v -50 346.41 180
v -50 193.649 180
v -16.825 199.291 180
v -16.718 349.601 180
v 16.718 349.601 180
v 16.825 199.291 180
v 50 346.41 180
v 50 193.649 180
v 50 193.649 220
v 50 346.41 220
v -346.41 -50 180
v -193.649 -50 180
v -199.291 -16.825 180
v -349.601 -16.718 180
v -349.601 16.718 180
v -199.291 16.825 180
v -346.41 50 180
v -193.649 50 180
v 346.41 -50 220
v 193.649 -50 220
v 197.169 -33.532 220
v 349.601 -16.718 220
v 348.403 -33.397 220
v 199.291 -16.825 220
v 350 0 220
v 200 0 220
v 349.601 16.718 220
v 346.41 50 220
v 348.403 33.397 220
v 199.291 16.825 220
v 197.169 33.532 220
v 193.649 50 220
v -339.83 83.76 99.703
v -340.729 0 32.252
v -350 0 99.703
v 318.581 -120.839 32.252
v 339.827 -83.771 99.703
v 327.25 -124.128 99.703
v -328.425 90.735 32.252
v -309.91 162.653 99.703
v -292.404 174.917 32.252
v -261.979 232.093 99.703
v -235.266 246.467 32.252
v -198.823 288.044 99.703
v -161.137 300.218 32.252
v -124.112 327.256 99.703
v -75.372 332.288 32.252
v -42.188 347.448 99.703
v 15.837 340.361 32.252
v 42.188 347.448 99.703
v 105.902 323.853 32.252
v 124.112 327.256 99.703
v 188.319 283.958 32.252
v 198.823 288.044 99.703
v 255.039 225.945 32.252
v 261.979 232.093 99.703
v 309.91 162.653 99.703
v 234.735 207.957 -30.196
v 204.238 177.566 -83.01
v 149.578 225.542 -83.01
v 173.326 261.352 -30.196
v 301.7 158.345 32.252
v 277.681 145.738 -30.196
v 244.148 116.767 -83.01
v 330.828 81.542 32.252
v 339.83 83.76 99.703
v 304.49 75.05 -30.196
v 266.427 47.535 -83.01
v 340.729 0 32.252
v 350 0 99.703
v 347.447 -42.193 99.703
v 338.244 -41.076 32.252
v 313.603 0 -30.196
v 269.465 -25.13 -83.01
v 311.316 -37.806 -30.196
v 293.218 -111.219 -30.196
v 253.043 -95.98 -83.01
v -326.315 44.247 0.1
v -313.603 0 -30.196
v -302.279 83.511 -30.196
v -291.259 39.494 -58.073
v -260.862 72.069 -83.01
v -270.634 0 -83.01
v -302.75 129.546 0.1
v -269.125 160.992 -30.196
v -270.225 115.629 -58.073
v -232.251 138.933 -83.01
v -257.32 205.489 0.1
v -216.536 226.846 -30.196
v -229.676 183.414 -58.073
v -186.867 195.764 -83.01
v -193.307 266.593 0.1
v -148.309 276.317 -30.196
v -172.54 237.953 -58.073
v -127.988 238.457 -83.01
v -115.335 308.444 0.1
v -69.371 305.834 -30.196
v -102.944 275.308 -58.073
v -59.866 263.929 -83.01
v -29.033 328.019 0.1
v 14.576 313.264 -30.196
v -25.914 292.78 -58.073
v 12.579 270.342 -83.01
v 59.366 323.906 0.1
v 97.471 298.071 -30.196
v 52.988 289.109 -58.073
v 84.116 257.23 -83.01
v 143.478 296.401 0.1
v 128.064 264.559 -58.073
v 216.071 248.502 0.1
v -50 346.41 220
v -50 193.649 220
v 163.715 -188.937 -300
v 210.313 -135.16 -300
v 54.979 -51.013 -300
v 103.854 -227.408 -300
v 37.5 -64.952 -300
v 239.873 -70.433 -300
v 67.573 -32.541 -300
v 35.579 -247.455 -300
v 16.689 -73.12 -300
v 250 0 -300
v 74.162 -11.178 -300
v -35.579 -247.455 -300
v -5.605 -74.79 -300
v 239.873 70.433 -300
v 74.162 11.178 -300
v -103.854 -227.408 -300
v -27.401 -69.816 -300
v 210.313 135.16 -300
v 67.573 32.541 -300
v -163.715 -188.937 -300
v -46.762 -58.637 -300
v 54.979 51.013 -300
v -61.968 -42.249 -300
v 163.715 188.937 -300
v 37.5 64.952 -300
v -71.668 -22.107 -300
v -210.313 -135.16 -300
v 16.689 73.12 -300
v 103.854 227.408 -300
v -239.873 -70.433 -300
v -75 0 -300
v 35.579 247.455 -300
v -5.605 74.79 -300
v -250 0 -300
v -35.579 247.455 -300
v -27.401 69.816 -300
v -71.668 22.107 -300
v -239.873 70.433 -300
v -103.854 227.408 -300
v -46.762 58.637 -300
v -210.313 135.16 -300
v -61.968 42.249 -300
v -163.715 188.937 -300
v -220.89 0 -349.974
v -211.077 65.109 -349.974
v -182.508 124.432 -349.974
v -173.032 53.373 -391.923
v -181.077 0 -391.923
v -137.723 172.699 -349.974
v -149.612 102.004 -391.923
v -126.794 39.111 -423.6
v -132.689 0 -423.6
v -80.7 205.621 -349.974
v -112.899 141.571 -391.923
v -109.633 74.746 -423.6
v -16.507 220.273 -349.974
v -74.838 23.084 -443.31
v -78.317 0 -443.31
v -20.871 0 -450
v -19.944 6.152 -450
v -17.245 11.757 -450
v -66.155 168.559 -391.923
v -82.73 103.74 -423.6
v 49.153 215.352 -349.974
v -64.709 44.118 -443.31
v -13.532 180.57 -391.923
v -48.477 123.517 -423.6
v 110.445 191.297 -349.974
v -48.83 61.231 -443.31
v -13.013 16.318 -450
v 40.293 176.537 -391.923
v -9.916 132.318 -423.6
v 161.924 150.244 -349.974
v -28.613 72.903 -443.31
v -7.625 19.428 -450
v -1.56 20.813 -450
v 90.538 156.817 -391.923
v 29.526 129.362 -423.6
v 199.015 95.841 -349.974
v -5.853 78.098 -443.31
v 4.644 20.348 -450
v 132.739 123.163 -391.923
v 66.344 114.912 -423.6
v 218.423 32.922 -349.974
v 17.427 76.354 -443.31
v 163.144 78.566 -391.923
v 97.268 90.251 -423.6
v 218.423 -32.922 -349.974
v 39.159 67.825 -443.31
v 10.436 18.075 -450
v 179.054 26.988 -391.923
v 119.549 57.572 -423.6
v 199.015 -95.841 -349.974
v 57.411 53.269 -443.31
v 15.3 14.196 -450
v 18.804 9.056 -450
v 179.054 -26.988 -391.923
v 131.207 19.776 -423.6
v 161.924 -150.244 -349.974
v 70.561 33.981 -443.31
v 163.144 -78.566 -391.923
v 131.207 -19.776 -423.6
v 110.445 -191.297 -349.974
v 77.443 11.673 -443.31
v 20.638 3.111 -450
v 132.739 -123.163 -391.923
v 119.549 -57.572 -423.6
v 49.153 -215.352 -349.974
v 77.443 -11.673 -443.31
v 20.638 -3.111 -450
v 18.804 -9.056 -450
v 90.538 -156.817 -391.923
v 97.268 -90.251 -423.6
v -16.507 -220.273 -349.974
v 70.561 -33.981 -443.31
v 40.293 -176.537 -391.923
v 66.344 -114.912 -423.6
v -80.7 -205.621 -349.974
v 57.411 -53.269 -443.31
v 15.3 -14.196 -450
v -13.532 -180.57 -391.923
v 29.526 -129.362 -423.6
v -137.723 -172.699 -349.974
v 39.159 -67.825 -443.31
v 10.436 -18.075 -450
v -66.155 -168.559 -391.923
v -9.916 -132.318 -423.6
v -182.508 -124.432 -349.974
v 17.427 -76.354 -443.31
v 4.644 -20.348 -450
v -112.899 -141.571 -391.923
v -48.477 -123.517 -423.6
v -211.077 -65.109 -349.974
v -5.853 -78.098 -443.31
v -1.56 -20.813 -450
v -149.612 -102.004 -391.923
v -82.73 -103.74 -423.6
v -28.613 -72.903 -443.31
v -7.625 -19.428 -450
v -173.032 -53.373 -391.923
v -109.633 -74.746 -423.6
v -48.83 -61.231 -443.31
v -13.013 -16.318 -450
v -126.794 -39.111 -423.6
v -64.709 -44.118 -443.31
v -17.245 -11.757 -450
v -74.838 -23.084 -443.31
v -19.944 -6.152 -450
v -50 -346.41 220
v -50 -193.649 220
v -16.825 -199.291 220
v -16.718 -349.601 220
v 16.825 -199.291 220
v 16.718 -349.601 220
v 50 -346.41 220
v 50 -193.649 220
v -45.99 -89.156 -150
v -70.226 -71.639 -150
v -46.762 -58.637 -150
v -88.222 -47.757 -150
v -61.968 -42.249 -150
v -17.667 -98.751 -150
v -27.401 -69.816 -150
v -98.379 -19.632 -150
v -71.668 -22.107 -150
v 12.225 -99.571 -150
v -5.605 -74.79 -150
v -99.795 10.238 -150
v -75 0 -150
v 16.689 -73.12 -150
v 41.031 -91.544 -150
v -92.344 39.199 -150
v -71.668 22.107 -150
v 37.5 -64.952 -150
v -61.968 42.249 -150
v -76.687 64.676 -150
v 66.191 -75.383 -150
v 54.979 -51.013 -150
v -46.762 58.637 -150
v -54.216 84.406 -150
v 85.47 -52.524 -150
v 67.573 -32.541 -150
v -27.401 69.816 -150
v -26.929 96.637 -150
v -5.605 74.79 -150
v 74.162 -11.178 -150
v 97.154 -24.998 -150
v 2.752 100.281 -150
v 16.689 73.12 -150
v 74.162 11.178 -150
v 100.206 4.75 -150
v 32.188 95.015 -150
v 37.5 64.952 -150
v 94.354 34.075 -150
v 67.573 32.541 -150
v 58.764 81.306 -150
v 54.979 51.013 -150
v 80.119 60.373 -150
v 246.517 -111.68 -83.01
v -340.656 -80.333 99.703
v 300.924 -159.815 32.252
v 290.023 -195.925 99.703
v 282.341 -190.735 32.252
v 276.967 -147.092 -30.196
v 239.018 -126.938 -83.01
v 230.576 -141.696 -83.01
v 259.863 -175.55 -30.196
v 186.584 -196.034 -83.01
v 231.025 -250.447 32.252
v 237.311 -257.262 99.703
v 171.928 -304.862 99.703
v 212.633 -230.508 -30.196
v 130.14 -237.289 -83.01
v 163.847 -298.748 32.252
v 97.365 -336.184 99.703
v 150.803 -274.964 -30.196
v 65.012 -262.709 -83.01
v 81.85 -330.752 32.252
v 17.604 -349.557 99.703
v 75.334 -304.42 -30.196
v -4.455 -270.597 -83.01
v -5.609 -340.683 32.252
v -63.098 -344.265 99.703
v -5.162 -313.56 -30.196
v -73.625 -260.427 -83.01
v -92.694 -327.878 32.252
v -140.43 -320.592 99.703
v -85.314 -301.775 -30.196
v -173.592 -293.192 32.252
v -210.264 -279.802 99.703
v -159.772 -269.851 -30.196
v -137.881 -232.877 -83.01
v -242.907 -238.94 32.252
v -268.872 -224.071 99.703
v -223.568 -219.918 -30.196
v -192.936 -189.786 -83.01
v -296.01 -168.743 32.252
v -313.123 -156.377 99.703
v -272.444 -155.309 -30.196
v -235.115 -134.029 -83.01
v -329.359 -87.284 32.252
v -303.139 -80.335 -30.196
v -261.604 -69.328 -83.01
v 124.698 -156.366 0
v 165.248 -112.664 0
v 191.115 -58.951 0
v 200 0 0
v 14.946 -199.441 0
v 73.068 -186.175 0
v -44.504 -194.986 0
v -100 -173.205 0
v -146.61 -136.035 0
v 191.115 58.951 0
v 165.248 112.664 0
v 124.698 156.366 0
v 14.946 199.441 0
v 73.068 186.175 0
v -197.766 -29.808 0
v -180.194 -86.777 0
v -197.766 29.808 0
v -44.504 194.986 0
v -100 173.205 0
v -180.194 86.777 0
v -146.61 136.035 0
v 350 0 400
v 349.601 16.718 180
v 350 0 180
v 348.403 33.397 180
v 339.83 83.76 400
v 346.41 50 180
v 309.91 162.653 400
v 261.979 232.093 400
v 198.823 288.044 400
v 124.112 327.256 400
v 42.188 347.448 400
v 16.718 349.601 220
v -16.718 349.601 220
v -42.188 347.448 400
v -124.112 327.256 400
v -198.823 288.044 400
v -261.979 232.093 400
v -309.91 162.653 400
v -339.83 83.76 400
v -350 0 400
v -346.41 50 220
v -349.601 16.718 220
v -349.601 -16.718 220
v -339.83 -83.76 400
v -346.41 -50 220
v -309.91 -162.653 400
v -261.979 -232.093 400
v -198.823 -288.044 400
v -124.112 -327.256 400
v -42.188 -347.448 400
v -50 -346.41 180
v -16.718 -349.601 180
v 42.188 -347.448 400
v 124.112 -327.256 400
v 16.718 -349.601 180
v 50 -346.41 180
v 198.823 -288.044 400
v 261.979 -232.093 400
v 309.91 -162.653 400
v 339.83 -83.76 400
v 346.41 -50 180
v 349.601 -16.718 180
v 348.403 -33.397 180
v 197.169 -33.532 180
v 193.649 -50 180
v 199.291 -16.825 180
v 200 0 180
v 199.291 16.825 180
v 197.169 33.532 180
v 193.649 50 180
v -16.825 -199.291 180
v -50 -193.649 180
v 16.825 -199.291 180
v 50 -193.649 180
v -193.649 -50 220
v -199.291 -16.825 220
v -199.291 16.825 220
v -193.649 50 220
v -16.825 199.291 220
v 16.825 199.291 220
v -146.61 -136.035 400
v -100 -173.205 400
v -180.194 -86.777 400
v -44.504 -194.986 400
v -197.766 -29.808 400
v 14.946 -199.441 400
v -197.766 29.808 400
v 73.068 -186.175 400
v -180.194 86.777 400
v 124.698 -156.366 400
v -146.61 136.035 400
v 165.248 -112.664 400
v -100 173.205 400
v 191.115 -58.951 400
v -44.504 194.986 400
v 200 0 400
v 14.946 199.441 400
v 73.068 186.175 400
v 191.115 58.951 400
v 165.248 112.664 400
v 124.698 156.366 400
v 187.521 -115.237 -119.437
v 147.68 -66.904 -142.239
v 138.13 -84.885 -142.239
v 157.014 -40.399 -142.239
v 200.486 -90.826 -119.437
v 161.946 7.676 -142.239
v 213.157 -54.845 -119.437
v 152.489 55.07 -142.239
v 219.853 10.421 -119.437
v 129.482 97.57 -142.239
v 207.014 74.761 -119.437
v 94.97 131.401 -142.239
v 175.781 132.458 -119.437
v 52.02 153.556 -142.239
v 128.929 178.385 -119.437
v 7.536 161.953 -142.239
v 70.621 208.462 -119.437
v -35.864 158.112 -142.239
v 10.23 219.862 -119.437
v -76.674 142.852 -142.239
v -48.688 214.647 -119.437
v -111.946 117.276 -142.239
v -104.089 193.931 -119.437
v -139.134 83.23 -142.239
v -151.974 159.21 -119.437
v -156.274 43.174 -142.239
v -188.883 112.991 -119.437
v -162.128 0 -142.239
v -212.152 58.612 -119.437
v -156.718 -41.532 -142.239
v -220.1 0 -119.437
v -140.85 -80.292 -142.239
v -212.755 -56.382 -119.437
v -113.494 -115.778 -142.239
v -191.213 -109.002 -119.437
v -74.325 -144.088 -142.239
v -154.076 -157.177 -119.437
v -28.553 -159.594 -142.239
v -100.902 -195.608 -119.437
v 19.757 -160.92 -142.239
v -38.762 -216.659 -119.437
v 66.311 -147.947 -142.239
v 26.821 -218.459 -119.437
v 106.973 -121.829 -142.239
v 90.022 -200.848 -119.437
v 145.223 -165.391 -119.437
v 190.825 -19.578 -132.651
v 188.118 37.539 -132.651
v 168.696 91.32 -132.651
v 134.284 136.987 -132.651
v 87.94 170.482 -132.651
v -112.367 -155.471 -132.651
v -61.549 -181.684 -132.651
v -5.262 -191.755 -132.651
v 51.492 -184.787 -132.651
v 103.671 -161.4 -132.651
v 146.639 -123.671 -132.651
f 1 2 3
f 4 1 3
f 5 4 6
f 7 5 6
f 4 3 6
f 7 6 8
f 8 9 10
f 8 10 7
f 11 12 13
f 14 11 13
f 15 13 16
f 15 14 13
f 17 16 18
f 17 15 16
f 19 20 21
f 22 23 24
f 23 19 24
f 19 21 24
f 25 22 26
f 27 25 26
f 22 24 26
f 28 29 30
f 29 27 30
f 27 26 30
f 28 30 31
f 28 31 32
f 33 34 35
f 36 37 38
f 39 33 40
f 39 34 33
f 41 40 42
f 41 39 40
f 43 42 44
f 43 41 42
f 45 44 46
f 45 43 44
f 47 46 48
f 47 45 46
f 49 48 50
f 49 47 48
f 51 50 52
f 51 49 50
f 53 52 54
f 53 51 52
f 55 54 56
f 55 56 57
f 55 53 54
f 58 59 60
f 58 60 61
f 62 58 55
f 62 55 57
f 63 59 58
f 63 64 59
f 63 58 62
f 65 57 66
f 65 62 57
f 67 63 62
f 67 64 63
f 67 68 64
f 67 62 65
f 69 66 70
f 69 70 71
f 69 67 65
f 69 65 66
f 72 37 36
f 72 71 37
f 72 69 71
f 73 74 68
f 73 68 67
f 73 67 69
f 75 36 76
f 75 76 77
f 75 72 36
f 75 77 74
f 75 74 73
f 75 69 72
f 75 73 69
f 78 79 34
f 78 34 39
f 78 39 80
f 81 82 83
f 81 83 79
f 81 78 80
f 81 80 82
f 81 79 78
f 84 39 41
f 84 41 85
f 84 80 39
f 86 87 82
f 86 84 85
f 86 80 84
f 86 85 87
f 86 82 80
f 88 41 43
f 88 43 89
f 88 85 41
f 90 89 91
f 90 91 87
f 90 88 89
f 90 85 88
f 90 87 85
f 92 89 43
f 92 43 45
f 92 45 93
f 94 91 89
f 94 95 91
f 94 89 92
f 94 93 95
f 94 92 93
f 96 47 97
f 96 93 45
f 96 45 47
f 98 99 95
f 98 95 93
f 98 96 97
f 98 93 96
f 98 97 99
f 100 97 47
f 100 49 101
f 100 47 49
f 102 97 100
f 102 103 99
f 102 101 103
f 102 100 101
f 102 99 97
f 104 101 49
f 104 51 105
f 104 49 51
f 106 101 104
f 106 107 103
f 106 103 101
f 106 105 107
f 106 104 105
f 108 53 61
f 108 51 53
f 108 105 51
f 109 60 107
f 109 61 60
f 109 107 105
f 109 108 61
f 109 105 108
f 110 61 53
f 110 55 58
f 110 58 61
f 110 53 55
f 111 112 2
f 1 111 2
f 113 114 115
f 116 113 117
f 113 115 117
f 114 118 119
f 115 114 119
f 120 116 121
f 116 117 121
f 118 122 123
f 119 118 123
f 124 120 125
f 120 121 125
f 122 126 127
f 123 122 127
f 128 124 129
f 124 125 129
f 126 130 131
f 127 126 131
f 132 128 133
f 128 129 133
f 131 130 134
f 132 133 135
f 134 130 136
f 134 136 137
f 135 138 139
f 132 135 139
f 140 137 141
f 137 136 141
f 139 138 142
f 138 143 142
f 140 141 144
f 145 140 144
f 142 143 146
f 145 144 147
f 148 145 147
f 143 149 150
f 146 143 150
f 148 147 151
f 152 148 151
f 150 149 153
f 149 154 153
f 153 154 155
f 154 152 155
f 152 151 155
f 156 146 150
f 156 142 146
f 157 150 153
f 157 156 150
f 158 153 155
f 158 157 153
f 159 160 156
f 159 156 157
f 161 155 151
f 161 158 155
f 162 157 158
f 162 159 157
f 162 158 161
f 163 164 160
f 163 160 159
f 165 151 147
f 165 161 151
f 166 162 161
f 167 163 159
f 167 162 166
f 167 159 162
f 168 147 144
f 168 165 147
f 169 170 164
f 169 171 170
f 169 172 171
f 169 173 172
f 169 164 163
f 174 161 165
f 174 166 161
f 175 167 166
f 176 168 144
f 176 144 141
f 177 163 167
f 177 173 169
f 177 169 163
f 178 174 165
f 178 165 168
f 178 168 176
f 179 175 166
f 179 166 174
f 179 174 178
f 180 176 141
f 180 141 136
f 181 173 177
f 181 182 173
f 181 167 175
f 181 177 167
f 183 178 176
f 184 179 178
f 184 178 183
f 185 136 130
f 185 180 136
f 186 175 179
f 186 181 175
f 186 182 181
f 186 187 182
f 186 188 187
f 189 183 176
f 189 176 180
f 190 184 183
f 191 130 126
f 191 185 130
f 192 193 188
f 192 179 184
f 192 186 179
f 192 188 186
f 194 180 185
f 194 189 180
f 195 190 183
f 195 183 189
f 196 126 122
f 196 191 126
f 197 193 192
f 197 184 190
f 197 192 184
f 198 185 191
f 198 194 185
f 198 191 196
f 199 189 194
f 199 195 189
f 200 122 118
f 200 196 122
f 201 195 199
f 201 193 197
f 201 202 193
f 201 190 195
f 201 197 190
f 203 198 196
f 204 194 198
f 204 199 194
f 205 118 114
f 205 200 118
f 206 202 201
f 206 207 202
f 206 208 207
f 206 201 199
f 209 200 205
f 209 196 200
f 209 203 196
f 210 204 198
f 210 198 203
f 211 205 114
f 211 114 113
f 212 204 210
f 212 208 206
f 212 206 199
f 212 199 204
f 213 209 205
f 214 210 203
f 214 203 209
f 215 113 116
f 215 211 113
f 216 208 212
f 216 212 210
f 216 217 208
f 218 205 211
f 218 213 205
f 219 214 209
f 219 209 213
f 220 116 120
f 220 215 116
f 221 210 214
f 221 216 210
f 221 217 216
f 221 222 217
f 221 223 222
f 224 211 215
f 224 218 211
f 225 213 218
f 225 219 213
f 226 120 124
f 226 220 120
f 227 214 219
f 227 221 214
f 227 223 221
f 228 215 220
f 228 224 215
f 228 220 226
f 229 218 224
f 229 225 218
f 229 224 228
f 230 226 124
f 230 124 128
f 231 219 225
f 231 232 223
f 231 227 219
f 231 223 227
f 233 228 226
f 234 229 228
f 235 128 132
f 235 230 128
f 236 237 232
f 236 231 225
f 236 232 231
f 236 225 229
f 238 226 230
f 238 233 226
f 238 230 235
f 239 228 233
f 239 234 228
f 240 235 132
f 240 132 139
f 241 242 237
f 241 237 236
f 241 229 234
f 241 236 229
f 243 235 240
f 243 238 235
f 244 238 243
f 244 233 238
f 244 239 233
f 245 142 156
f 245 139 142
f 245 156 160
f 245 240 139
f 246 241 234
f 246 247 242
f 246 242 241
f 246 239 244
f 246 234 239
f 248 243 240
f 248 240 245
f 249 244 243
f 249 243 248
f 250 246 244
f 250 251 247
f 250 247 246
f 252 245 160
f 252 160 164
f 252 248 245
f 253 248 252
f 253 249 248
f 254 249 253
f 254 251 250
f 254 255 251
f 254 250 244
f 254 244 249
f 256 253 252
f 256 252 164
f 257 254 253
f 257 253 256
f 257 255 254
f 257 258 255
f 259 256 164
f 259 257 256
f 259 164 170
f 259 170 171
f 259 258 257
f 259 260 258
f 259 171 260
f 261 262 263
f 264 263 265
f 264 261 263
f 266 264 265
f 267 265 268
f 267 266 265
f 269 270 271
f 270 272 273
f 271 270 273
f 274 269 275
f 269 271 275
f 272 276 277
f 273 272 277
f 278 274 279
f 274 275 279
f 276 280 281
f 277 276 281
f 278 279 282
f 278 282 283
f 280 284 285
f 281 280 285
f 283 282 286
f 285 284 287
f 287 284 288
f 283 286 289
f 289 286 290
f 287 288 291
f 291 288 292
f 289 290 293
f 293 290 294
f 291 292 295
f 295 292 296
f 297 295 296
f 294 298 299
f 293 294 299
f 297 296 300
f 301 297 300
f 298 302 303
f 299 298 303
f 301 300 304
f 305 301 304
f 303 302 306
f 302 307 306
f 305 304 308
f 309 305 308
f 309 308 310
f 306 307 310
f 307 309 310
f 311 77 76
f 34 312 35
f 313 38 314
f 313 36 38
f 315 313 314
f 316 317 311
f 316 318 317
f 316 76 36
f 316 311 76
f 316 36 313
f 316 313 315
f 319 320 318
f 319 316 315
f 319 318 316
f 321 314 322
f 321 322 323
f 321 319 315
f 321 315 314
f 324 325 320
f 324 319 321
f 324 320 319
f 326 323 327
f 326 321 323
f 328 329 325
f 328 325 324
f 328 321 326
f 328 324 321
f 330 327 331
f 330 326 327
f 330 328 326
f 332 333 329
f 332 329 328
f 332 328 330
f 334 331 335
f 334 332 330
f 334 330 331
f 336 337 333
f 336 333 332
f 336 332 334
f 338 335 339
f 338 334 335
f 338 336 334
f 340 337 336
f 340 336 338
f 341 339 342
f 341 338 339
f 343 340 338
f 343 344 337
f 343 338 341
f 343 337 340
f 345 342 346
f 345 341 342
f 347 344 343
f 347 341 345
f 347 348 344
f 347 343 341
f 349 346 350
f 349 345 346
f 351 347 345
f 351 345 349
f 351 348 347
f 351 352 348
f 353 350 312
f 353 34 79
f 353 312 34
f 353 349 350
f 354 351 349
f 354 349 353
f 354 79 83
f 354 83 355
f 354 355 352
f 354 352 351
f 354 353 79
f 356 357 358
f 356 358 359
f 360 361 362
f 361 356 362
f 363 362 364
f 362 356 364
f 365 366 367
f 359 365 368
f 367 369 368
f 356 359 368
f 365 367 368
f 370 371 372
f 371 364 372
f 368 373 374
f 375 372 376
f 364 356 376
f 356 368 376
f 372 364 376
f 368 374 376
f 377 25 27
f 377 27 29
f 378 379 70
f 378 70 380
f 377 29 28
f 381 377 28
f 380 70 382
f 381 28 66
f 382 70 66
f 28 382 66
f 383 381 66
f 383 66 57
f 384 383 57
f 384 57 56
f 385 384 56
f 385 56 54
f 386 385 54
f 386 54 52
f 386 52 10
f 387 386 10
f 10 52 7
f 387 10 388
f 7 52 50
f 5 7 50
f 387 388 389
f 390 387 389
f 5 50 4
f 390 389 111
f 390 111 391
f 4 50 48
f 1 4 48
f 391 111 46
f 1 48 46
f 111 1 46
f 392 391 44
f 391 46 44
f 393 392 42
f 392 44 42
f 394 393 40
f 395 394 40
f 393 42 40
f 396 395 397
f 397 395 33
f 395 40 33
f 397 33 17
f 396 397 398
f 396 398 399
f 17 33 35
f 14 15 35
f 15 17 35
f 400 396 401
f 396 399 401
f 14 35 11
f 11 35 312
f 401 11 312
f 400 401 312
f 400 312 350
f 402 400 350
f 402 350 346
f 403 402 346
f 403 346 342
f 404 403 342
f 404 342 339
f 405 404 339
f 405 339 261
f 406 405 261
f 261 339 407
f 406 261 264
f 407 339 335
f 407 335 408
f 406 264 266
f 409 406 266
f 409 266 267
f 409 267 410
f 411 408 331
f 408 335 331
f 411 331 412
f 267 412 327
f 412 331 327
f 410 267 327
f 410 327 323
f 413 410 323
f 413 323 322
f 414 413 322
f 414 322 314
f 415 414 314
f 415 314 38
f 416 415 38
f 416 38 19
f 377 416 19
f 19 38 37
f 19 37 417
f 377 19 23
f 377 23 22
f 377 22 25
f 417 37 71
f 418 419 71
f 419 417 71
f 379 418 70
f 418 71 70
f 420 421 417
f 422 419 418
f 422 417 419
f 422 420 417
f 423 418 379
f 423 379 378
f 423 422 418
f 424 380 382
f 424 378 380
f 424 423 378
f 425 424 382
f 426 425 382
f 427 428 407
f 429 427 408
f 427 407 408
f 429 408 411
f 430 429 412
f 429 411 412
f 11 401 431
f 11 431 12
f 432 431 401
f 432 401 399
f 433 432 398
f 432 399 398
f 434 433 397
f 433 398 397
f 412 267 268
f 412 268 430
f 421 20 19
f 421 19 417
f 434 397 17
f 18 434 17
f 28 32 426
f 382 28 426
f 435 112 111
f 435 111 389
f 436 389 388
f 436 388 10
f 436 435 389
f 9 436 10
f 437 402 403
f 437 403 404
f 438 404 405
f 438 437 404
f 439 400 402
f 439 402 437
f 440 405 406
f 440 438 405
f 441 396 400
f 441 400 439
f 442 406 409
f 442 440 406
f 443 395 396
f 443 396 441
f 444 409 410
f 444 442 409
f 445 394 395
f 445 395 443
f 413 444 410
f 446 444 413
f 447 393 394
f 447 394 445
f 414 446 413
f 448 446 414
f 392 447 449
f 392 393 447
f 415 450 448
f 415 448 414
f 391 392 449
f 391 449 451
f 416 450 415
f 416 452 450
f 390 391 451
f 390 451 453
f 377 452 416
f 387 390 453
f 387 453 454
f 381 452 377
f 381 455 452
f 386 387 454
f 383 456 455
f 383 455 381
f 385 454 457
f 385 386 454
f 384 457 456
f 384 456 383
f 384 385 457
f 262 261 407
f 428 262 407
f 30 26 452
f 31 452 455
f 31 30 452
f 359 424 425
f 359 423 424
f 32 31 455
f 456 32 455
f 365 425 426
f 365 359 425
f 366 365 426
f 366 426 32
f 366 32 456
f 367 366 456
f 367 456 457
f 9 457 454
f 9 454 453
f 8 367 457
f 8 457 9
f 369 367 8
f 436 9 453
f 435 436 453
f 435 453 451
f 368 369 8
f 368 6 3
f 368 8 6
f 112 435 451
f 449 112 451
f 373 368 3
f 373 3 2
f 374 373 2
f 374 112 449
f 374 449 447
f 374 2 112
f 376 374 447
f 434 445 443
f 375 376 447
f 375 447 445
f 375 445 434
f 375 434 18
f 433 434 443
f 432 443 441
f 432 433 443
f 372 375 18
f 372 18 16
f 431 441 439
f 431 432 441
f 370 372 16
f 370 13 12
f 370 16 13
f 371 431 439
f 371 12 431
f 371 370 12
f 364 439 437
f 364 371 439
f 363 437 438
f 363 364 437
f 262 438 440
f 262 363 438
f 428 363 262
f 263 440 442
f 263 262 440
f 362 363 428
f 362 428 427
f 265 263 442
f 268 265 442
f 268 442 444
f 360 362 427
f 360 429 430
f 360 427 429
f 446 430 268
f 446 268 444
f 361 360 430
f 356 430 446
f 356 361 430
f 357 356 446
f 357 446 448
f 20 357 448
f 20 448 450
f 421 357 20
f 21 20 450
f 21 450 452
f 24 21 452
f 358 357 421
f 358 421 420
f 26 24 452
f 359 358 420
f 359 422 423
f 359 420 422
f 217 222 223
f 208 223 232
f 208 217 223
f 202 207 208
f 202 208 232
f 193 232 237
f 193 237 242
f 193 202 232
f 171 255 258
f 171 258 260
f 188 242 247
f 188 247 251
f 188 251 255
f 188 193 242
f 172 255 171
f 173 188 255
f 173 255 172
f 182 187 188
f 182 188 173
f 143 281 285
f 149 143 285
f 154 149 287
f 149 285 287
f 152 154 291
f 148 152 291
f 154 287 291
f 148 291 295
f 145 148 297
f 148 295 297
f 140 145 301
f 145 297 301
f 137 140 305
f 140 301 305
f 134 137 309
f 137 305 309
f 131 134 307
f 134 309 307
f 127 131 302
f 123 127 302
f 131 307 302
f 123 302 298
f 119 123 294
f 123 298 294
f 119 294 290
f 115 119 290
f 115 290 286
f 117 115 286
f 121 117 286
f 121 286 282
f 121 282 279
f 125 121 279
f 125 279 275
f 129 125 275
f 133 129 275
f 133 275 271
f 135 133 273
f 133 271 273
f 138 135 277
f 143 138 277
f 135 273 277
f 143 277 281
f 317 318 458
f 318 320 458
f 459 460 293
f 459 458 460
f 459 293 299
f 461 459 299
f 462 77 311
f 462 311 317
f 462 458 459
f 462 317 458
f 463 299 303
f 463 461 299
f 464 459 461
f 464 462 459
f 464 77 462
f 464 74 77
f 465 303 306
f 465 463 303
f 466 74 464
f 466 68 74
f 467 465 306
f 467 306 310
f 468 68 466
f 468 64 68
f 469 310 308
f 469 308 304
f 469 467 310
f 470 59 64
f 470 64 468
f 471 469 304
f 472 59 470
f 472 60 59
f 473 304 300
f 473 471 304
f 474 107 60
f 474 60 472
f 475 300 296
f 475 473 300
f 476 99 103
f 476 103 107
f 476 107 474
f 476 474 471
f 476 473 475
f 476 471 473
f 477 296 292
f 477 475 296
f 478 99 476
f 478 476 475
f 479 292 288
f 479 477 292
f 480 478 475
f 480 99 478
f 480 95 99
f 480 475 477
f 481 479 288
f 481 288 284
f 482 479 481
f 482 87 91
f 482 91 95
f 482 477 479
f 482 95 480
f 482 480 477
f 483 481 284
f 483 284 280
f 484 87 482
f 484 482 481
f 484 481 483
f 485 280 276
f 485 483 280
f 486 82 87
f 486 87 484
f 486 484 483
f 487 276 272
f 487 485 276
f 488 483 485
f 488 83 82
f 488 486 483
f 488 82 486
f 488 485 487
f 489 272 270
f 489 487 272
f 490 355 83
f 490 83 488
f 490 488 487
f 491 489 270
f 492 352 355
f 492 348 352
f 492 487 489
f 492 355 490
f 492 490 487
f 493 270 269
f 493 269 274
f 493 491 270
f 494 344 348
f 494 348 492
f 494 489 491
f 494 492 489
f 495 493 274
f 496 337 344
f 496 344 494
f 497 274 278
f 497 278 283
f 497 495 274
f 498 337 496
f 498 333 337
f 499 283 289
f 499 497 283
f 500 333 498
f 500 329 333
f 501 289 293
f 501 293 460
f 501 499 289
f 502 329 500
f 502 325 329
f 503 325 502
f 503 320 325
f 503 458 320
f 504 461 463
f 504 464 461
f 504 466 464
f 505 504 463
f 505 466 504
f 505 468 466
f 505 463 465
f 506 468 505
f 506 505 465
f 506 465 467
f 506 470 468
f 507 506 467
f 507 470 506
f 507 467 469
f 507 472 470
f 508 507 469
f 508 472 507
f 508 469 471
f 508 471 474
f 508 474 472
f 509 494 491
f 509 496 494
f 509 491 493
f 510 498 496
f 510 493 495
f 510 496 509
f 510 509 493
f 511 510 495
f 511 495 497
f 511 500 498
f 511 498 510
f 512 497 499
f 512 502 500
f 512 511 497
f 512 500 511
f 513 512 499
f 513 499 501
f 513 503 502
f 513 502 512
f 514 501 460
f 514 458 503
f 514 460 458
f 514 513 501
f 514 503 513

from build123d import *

# Parameters (mm, degrees)
SKETCH1_R               = 350
SKETCH1_R_2             = 200
BOSS_EXTRUDE2_DEPTH     = 400
CUT_EXTRUDE2_DEPTH      = 637.396103068
CUT_EXTRUDE2_DEPTH_BACK = 637.396103068
SKETCH2_W               = 100
SKETCH2_H               = 40
CUT_EXTRUDE3_DEPTH      = 637.396103068
CUT_EXTRUDE3_DEPTH_BACK = 637.396103068
SKETCH3_W               = 40
SKETCH3_H               = 100
BOSS_EXTRUDE3_START     = 10
SKETCH6_R               = 350
BOSS_EXTRUDE3_DEPTH     = 10
SKETCH7_R               = 75
BOSS_EXTRUDE4_DEPTH     = 150
SKETCH9_R               = 250
BOSS_EXTRUDE5_DEPTH     = 150
FILLET1_R               = 250
FILLET3_R               = 250
FILLET4_R               = 250


with BuildPart() as part:
    # Sketch1 → Boss-Extrude2 (new body)
    with BuildSketch(Plane.XY):
        Circle(SKETCH1_R)
        Circle(SKETCH1_R_2, mode=Mode.SUBTRACT)
    extrude(amount=BOSS_EXTRUDE2_DEPTH)

    # Sketch2 → Cut-Extrude2 (cut, two sides: drawn at the far end of the back side and taken through both)
    with BuildSketch(Plane(origin=(0, 0, 0), x_dir=(1, 0, 0), z_dir=(0, 1, 0)).offset(-CUT_EXTRUDE2_DEPTH_BACK)):
        with Locations((0, -200)):
            Rectangle(SKETCH2_W, SKETCH2_H)
    extrude(amount=CUT_EXTRUDE2_DEPTH + CUT_EXTRUDE2_DEPTH_BACK, mode=Mode.SUBTRACT)

    # Sketch3 → Cut-Extrude3 (cut, two sides: drawn at the far end of the back side and taken through both)
    with BuildSketch(Plane(origin=(0, 0, 0), x_dir=(0, 0, -1), z_dir=(1, 0, 0)).offset(-CUT_EXTRUDE3_DEPTH_BACK)):
        with Locations((-200, 0)):
            Rectangle(SKETCH3_W, SKETCH3_H)
    extrude(amount=CUT_EXTRUDE3_DEPTH + CUT_EXTRUDE3_DEPTH_BACK, mode=Mode.SUBTRACT)

    # Sketch6 → Boss-Extrude3 (add)
    with BuildSketch(Plane(origin=(0, 0, 0), x_dir=(-1, 0, 0), z_dir=(0, 0, -1)).offset(BOSS_EXTRUDE3_START)):
        Circle(SKETCH6_R)
    extrude(amount=-BOSS_EXTRUDE3_DEPTH)

    # Loft4: read off the stored shape, not the designer's step
    # Loft4: loft between two sections, ruled curve by curve
    loft4_from = [
        Edge.make_bspline([(170.39658005, -104.713922223, -150), (379.824424496, 236.079237876, -150), (39.031264397, 445.507082323, -150), (-170.39658005, 104.713922223, -150), (-379.824424496, -236.079237876, -150), (-39.031264397, -445.507082323, -150), (170.39658005, -104.713922223, -150)], [0, 0, 0, 0, 0.5, 0.5, 0.5, 1, 1, 1, 1], 3, [1, 0.333333333, 0.333333333, 1, 0.333333333, 0.333333333, 1]),
    ]
    loft4_to = [
        Edge.make_bspline([(327.249685966, -124.127527305, -10), (575.504740577, 530.371844627, -10), (-78.994631356, 778.626899238, -10), (-327.249685966, 124.127527305, -10), (-575.504740577, -530.371844627, -10), (78.994631356, -778.626899238, -10), (327.249685966, -124.127527305, -10)], [0, 0, 0, 0, 0.5, 0.5, 0.5, 1, 1, 1, 1], 3, [1, 0.333333333, 0.333333333, 1, 0.333333333, 0.333333333, 1]),
    ]
    loft4 = Solid(Shell([*[Face.make_surface_from_curves(loft4_from[k], loft4_to[k]) for k in range(1)], Face(Wire(loft4_from)), Face(Wire(loft4_to))]))
    add(loft4)

    # Sketch7 → Boss-Extrude4 (add)
    with BuildSketch(Plane(origin=(0, 0, -150), x_dir=(-1, 0, 0), z_dir=(0, 0, -1))):
        Circle(SKETCH7_R)
    extrude(amount=BOSS_EXTRUDE4_DEPTH)

    # Sketch9 → Boss-Extrude5 (add)
    with BuildSketch(Plane(origin=(0, 0, -300), x_dir=(-1, 0, 0), z_dir=(0, 0, -1))):
        Circle(SKETCH9_R)
    extrude(amount=BOSS_EXTRUDE5_DEPTH)

    # Fillet1
    # the kernel refuses this fillet: 250 mm, written as the material it takes off along each edge
    with BuildSketch(Plane(origin=(0, 0, -450), x_dir=(-1, 0, 0), z_dir=(0, -1, 0))) as fillet1_piece_1:
        with BuildLine():
            CenterArc((20.871215252, -250), FILLET1_R, 23.578178478, 66.421821522)
            Line((20.871215252, 0), (20.871215252, 5))
            Line((20.871215252, 5), (250, 5))
            Line((250, 5), (255, 0))
            ThreePointArc((255, 0), (255, -75), (254.582575695, -148))
            Line((254.582575695, -148), (250, -150))
        make_face()
    revolve(axis=Axis((0, 0, -450), (0, 0, -1)), mode=Mode.SUBTRACT)

    # Fillet3
    # the kernel refuses this fillet: 250 mm, written as the material it takes off along each edge
    with BuildSketch(Plane(origin=(0, 0, -150), x_dir=(0.8519829002496553, -0.5235696111141154, 0), z_dir=(-0.5235696111141154, -0.8519829002496553, 0))) as fillet3_piece_1:
        with BuildLine():
            CenterArc((100.318750936, 250), FILLET3_R, 270, 42.94225565)
            Line((270.633984519, 66.989833043), (274.04028919, 63.329629703))
            ThreePointArc((274.04028919, 63.329629703), (238.570984694, 30.057815333), (203.487874785, -3.582559069))
            Line((203.487874785, -3.582559069), (200, -5))
            Line((200, -5), (100.318750936, -5))
            Line((100.318750936, -5), (100.318750936, 0))
        make_face()
    revolve(axis=Axis((0, 0, -150), (0, 0, 1)), mode=Mode.SUBTRACT)

    # Fillet4
    # the kernel refuses this fillet: 250 mm, written as the material it takes off along each edge
    with BuildSketch(Plane(origin=(0, 0, -10), x_dir=(-1, 0, 0), z_dir=(0, -1, 0))) as fillet4_piece_1:
        with BuildLine():
            CenterArc((100, -109.702841138), FILLET4_R, 0, 46.957870566)
            Line((350, -109.702841138), (355, -109.702841138))
            Line((355, -109.702841138), (355, 0))
            Line((355, 0), (353.36883922, 3.694715457))
            ThreePointArc((353.36883922, 3.694715457), (313.60959417, 40.086717001), (274.046664209, 76.664427119))
            Line((274.046664209, 76.664427119), (270.633984518, 73.010166957))
        make_face()
    revolve(axis=Axis((0, 0, -10), (0, 0, -1)), revolution_arc=200.772, mode=Mode.SUBTRACT)
    with BuildSketch(Plane(origin=(0, 0, -10), x_dir=(0.9349991027611482, -0.35465007801472115, 0), z_dir=(0.35465007801472115, 0.9349991027611482, 0))) as fillet4_piece_2:
        with BuildLine():
            CenterArc((100, -109.702841138), FILLET4_R, 0, 46.957870566)
            Line((350, -109.702841138), (355, -109.702841138))
            Line((355, -109.702841138), (355, 0))
            Line((355, 0), (353.36883922, 3.694715457))
            ThreePointArc((353.36883922, 3.694715457), (313.60959417, 40.086717001), (274.046664209, 76.664427119))
            Line((274.046664209, 76.664427119), (270.633984519, 73.010166957))
        make_face()
    revolve(axis=Axis((0, 0, -10), (0, 0, -1)), revolution_arc=159.228, mode=Mode.SUBTRACT)


solid = part.part
